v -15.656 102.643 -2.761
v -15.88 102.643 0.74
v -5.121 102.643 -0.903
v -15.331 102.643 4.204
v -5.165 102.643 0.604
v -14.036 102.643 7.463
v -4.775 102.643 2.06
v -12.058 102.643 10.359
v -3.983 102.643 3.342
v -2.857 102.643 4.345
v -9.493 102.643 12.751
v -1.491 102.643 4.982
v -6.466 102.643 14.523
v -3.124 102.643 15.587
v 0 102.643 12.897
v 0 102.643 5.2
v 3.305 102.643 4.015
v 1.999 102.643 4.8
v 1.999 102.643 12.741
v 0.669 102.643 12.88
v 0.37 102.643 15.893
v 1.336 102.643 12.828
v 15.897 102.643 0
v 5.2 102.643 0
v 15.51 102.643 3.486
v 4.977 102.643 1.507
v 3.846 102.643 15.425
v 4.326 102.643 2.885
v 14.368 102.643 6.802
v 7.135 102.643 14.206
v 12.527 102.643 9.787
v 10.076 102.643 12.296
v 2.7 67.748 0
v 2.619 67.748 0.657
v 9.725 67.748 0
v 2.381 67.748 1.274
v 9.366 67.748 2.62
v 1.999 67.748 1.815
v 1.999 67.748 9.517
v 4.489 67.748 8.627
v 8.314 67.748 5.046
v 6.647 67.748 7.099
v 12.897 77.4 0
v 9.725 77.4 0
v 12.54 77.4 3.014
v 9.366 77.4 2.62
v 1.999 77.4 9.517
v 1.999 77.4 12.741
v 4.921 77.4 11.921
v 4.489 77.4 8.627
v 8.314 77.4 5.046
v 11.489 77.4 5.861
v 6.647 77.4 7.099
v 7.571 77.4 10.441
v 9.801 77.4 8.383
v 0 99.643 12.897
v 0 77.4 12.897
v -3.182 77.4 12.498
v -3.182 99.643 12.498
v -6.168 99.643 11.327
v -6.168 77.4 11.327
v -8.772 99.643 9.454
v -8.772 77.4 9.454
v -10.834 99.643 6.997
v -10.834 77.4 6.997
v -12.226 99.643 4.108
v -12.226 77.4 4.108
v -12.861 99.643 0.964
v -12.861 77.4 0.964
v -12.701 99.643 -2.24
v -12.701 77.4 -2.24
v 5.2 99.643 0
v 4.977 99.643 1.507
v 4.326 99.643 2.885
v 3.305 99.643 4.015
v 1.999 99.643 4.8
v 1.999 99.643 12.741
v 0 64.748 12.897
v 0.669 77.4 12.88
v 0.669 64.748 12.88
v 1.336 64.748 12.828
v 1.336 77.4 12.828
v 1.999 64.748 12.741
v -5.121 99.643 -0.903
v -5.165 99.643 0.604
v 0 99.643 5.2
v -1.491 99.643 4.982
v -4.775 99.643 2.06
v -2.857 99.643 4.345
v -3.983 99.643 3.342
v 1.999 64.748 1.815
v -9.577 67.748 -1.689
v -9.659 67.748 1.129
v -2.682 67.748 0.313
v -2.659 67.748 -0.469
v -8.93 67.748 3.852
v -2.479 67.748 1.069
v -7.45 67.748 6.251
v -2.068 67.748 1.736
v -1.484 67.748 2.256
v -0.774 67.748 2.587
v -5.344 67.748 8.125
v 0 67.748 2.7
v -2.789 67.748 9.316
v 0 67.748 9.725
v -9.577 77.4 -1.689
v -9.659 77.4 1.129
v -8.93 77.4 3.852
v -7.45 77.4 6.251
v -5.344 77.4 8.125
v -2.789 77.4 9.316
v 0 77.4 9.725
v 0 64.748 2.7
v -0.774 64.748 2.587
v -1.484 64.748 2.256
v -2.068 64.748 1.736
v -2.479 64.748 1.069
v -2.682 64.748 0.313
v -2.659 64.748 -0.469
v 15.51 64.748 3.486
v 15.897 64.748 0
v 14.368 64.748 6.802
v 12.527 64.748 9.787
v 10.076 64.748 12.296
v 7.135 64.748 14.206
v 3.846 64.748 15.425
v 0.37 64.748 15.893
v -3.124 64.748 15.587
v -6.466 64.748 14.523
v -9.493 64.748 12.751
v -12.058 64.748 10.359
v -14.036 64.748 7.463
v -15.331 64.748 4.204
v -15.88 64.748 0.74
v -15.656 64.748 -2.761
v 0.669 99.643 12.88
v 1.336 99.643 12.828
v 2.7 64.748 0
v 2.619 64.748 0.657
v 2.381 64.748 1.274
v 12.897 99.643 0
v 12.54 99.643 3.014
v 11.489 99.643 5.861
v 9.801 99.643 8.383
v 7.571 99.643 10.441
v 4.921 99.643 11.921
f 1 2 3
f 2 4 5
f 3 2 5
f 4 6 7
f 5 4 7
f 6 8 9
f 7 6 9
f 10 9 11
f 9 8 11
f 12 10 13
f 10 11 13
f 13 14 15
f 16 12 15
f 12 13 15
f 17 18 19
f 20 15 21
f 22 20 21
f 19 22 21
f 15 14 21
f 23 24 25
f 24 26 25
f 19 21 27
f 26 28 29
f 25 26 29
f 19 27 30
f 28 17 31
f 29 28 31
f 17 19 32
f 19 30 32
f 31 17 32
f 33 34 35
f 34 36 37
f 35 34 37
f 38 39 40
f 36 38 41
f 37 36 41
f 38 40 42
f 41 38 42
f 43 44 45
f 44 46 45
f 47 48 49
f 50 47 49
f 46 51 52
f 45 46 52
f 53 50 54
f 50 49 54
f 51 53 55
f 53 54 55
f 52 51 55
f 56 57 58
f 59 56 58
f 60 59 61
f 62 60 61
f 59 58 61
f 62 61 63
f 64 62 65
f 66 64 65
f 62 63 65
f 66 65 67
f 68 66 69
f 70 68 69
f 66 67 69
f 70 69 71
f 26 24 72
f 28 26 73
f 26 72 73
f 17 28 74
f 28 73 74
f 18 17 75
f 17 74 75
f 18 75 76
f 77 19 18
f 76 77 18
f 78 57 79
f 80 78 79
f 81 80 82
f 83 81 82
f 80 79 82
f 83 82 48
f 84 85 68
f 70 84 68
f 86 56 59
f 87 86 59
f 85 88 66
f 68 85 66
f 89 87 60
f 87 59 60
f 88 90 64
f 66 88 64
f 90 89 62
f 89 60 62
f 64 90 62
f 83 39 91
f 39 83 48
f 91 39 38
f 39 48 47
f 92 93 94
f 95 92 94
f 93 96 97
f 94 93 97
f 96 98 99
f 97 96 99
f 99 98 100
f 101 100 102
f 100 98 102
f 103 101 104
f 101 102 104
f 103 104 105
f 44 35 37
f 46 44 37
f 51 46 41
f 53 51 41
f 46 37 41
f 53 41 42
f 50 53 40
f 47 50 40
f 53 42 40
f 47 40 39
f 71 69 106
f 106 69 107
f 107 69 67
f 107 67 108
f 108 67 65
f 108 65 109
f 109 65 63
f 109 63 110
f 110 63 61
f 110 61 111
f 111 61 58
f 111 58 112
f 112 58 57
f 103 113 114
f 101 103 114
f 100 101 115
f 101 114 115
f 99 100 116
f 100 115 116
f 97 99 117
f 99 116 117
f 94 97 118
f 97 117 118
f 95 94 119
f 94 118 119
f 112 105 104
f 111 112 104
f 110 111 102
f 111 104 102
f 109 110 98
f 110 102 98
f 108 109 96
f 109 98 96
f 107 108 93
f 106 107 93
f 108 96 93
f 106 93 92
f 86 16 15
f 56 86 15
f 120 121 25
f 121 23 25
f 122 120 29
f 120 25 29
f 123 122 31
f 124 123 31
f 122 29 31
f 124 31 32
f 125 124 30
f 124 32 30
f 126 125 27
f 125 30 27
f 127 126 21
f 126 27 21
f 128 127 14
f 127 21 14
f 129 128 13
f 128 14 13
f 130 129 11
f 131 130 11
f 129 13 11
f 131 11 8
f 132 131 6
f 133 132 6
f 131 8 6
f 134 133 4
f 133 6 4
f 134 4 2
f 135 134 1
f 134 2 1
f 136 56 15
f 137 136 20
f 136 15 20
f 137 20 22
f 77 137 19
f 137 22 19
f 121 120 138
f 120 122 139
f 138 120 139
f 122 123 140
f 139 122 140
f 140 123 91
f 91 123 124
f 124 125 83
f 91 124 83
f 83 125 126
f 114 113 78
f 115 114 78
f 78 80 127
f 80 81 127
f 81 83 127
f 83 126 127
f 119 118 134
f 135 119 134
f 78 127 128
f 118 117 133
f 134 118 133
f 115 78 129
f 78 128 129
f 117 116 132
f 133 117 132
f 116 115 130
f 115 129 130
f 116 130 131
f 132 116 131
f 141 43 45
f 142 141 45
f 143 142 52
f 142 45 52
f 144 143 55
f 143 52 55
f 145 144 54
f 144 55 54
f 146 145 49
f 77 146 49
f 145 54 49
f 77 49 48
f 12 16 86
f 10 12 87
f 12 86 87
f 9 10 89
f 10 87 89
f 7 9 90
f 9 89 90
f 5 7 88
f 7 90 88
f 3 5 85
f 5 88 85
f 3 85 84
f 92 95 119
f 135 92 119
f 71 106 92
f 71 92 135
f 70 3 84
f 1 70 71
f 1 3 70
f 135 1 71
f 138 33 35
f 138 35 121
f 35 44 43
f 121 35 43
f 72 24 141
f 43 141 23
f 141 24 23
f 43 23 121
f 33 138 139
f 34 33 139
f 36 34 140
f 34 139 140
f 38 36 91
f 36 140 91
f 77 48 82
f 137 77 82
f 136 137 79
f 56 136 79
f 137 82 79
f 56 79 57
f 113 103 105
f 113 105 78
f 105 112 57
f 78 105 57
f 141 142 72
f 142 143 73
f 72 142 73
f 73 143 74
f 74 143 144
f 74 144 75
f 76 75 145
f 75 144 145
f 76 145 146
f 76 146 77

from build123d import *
from build123d.topology import SkipClean

# Parameters (mm, degrees)
REVOLVE1_ANGLE     = 190
CUT_EXTRUDE1_DEPTH = 45.06204684


with BuildPart() as part:
    # Sketch1 → Revolve1 (revolve)
    with BuildSketch(Plane.XY):
        Polygon((15.897098368, 102.642966667), (5.2, 102.642966667), (5.2, 99.642966667), (12.897098368, 99.642966667), (12.897098368, 77.4), (9.725, 77.4), (9.725, 67.748), (2.7, 67.748), (2.7, 64.748), (15.897098368, 64.748), align=None)
    revolve(axis=Axis((0, 104.537715, 0), (0, -1, 0)), revolution_arc=REVOLVE1_ANGLE)

    # Sketch2 → Cut-Extrude1 (cut, through all)
    with SkipClean():  # the faces are left unmerged after this step: merging them gives an invalid solid
        with BuildSketch(Plane(origin=(0, 102.642966667, 0), x_dir=(1, 0, 0), z_dir=(0, 1, 0))):
            with BuildLine():
                Line((0, 0), (0, -12.897098368))
                ThreePointArc((0, -12.897098368), (1.002621368, -12.858067378), (1.999174193, -12.741210651))
                Line((1.999174193, -12.741210651), (1.999174193, 0))
                Line((1.999174193, 0), (0, 0))
            make_face()
        extrude(amount=-CUT_EXTRUDE1_DEPTH, mode=Mode.SUBTRACT)


solid = part.part
